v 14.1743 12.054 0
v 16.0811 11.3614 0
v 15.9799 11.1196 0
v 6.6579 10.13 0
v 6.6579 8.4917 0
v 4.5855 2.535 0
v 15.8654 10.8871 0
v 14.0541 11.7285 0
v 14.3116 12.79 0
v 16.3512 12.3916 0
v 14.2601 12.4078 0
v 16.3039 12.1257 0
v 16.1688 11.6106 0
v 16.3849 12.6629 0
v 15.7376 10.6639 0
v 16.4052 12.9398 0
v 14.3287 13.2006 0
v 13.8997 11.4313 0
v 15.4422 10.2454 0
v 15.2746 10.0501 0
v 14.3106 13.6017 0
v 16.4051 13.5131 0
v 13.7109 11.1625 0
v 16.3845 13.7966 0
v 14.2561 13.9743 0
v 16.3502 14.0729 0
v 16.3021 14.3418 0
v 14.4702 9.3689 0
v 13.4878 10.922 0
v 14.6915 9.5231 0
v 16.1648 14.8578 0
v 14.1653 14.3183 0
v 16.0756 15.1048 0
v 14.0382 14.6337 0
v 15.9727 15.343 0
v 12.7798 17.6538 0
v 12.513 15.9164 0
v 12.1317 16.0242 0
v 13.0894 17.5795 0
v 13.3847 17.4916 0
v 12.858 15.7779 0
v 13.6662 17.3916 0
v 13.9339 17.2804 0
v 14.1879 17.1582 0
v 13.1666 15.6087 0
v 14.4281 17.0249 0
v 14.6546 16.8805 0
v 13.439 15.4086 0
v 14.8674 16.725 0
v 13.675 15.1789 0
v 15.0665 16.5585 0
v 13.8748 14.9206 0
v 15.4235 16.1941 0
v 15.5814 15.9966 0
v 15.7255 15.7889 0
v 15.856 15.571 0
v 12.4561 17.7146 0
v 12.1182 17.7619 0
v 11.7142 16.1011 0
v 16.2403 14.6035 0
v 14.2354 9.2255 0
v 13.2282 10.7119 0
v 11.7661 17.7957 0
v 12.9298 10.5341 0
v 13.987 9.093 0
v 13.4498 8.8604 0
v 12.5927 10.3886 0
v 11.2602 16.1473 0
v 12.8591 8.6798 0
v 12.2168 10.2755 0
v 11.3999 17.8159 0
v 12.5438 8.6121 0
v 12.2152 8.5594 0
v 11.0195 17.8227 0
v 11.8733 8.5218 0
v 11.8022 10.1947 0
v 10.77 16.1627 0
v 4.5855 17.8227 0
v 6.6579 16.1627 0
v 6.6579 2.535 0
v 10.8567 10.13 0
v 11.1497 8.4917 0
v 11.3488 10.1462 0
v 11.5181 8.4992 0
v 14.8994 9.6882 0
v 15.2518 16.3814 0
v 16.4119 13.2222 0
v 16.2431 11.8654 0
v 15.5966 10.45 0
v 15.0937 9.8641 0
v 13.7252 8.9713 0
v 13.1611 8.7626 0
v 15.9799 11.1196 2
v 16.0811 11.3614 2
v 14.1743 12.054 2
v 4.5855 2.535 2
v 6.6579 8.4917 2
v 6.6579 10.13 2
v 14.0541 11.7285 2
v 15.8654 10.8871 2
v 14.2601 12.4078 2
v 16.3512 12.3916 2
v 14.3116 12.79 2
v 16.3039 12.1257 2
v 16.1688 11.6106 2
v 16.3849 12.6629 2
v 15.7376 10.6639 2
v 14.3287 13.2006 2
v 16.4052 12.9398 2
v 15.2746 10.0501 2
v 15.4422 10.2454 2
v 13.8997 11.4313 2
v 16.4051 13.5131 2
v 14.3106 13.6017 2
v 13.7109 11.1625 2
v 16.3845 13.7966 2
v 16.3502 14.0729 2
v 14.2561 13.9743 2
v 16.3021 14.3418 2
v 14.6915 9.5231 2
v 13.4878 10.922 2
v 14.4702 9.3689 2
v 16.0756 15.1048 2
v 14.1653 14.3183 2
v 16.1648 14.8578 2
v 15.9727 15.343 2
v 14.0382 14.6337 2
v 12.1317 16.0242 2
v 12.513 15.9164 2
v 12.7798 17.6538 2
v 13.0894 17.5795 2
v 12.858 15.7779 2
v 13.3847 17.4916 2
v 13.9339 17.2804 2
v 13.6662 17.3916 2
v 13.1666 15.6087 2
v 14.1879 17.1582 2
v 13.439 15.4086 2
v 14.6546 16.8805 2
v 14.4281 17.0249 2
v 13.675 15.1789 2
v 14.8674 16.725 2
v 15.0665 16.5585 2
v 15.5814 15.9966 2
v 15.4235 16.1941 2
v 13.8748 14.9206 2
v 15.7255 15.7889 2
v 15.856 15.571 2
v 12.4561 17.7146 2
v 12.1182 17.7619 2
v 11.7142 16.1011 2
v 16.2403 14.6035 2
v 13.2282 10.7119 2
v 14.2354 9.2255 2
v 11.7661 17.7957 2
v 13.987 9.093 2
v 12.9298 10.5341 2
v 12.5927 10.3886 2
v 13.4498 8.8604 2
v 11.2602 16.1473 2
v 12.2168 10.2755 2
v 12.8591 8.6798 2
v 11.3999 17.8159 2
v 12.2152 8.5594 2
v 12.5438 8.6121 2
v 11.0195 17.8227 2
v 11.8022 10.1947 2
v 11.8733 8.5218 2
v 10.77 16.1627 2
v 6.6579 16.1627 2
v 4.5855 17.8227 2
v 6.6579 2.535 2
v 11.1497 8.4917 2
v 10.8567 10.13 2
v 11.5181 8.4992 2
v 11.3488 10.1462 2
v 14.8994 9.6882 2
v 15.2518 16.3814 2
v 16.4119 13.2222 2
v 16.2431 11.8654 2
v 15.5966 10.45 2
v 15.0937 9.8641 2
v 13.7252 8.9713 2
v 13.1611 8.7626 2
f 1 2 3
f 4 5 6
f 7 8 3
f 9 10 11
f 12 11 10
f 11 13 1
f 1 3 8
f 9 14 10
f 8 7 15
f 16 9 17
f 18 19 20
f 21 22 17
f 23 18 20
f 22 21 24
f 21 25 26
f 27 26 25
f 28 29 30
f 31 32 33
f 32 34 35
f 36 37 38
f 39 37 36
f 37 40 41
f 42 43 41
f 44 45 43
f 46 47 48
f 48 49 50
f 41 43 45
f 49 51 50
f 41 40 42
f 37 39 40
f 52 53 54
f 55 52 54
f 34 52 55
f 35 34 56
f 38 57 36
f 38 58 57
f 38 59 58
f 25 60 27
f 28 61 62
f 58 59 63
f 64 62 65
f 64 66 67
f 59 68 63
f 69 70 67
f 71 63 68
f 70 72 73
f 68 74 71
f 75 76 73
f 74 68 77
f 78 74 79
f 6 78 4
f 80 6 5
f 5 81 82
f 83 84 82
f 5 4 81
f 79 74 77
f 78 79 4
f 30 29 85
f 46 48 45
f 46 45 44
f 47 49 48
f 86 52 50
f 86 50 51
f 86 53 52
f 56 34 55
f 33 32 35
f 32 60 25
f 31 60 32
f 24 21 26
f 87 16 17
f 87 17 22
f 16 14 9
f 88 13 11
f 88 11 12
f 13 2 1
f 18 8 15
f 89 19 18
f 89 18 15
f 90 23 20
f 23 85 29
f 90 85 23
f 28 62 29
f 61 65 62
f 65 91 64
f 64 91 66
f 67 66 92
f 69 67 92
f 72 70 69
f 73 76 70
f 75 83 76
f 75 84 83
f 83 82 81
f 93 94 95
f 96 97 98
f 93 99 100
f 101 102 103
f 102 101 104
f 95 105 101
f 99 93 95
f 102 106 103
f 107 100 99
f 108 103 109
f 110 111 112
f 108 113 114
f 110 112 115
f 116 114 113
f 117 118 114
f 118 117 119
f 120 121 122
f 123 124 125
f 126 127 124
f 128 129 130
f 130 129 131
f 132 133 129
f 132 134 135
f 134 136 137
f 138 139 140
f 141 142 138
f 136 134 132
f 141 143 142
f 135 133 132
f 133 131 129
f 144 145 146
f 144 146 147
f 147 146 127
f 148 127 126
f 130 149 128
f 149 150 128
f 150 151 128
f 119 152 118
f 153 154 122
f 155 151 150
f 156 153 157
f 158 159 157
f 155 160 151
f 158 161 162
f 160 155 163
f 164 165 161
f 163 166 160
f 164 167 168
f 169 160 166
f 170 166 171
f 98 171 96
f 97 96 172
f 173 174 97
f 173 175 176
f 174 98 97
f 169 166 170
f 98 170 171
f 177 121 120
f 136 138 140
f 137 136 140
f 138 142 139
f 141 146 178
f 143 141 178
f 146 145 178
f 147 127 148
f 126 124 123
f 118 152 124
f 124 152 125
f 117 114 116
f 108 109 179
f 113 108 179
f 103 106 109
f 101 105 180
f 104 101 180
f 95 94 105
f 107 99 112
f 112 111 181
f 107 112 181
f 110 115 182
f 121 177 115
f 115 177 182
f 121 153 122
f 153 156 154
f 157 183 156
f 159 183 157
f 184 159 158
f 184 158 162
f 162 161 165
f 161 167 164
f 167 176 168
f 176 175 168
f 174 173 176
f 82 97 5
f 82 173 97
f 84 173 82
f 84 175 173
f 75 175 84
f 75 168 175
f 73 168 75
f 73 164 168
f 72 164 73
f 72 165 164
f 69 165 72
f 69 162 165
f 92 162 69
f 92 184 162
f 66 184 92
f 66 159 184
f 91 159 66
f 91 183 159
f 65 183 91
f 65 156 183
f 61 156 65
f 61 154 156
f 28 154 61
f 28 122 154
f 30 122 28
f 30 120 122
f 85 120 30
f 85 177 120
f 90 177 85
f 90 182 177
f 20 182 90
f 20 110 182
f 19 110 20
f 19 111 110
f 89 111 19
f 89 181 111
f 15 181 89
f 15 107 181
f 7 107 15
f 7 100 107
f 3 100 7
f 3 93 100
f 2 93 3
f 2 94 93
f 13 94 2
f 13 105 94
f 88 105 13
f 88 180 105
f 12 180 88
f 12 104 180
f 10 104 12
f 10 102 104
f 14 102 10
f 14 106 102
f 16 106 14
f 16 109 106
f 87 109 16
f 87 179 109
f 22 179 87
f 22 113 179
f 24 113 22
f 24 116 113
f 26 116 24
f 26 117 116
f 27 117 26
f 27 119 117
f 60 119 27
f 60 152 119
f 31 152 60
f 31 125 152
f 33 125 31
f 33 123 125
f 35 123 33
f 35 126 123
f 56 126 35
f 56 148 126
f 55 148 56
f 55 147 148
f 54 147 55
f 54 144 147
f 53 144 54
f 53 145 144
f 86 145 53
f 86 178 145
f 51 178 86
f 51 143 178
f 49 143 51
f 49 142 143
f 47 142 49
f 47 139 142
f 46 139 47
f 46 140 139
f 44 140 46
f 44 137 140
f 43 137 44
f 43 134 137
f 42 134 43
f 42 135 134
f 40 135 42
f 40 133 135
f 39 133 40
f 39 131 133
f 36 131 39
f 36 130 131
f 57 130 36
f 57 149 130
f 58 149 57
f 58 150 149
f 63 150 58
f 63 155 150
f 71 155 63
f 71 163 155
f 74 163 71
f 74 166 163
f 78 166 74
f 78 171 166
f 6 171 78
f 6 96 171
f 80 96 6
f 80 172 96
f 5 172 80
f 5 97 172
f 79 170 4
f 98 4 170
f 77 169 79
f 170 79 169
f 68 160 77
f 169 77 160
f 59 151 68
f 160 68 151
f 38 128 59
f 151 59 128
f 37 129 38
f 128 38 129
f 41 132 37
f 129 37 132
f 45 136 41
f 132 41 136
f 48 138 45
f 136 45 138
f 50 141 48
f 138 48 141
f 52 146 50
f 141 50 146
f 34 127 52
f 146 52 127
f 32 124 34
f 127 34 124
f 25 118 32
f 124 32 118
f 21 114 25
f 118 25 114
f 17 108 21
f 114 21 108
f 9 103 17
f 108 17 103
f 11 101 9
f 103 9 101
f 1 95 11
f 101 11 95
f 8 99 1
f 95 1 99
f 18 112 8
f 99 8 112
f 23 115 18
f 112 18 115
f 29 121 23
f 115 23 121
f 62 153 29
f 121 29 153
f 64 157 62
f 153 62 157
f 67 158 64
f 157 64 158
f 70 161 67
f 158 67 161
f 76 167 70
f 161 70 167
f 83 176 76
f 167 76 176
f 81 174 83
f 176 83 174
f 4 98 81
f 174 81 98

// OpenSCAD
translate([10,10,0])letter("P");

font = "Liberation Sans";
letter_size = 16;
letter_height = 2;

module letter(l) {
	// Use linear_extrude() to make the letters 3D objects as they
	// are only 2D shapes when only using text()
	linear_extrude(height = letter_height) {
		text(l, size = letter_size, font = font, halign = "center", valign = "center", $fn = 50);
	}
}
